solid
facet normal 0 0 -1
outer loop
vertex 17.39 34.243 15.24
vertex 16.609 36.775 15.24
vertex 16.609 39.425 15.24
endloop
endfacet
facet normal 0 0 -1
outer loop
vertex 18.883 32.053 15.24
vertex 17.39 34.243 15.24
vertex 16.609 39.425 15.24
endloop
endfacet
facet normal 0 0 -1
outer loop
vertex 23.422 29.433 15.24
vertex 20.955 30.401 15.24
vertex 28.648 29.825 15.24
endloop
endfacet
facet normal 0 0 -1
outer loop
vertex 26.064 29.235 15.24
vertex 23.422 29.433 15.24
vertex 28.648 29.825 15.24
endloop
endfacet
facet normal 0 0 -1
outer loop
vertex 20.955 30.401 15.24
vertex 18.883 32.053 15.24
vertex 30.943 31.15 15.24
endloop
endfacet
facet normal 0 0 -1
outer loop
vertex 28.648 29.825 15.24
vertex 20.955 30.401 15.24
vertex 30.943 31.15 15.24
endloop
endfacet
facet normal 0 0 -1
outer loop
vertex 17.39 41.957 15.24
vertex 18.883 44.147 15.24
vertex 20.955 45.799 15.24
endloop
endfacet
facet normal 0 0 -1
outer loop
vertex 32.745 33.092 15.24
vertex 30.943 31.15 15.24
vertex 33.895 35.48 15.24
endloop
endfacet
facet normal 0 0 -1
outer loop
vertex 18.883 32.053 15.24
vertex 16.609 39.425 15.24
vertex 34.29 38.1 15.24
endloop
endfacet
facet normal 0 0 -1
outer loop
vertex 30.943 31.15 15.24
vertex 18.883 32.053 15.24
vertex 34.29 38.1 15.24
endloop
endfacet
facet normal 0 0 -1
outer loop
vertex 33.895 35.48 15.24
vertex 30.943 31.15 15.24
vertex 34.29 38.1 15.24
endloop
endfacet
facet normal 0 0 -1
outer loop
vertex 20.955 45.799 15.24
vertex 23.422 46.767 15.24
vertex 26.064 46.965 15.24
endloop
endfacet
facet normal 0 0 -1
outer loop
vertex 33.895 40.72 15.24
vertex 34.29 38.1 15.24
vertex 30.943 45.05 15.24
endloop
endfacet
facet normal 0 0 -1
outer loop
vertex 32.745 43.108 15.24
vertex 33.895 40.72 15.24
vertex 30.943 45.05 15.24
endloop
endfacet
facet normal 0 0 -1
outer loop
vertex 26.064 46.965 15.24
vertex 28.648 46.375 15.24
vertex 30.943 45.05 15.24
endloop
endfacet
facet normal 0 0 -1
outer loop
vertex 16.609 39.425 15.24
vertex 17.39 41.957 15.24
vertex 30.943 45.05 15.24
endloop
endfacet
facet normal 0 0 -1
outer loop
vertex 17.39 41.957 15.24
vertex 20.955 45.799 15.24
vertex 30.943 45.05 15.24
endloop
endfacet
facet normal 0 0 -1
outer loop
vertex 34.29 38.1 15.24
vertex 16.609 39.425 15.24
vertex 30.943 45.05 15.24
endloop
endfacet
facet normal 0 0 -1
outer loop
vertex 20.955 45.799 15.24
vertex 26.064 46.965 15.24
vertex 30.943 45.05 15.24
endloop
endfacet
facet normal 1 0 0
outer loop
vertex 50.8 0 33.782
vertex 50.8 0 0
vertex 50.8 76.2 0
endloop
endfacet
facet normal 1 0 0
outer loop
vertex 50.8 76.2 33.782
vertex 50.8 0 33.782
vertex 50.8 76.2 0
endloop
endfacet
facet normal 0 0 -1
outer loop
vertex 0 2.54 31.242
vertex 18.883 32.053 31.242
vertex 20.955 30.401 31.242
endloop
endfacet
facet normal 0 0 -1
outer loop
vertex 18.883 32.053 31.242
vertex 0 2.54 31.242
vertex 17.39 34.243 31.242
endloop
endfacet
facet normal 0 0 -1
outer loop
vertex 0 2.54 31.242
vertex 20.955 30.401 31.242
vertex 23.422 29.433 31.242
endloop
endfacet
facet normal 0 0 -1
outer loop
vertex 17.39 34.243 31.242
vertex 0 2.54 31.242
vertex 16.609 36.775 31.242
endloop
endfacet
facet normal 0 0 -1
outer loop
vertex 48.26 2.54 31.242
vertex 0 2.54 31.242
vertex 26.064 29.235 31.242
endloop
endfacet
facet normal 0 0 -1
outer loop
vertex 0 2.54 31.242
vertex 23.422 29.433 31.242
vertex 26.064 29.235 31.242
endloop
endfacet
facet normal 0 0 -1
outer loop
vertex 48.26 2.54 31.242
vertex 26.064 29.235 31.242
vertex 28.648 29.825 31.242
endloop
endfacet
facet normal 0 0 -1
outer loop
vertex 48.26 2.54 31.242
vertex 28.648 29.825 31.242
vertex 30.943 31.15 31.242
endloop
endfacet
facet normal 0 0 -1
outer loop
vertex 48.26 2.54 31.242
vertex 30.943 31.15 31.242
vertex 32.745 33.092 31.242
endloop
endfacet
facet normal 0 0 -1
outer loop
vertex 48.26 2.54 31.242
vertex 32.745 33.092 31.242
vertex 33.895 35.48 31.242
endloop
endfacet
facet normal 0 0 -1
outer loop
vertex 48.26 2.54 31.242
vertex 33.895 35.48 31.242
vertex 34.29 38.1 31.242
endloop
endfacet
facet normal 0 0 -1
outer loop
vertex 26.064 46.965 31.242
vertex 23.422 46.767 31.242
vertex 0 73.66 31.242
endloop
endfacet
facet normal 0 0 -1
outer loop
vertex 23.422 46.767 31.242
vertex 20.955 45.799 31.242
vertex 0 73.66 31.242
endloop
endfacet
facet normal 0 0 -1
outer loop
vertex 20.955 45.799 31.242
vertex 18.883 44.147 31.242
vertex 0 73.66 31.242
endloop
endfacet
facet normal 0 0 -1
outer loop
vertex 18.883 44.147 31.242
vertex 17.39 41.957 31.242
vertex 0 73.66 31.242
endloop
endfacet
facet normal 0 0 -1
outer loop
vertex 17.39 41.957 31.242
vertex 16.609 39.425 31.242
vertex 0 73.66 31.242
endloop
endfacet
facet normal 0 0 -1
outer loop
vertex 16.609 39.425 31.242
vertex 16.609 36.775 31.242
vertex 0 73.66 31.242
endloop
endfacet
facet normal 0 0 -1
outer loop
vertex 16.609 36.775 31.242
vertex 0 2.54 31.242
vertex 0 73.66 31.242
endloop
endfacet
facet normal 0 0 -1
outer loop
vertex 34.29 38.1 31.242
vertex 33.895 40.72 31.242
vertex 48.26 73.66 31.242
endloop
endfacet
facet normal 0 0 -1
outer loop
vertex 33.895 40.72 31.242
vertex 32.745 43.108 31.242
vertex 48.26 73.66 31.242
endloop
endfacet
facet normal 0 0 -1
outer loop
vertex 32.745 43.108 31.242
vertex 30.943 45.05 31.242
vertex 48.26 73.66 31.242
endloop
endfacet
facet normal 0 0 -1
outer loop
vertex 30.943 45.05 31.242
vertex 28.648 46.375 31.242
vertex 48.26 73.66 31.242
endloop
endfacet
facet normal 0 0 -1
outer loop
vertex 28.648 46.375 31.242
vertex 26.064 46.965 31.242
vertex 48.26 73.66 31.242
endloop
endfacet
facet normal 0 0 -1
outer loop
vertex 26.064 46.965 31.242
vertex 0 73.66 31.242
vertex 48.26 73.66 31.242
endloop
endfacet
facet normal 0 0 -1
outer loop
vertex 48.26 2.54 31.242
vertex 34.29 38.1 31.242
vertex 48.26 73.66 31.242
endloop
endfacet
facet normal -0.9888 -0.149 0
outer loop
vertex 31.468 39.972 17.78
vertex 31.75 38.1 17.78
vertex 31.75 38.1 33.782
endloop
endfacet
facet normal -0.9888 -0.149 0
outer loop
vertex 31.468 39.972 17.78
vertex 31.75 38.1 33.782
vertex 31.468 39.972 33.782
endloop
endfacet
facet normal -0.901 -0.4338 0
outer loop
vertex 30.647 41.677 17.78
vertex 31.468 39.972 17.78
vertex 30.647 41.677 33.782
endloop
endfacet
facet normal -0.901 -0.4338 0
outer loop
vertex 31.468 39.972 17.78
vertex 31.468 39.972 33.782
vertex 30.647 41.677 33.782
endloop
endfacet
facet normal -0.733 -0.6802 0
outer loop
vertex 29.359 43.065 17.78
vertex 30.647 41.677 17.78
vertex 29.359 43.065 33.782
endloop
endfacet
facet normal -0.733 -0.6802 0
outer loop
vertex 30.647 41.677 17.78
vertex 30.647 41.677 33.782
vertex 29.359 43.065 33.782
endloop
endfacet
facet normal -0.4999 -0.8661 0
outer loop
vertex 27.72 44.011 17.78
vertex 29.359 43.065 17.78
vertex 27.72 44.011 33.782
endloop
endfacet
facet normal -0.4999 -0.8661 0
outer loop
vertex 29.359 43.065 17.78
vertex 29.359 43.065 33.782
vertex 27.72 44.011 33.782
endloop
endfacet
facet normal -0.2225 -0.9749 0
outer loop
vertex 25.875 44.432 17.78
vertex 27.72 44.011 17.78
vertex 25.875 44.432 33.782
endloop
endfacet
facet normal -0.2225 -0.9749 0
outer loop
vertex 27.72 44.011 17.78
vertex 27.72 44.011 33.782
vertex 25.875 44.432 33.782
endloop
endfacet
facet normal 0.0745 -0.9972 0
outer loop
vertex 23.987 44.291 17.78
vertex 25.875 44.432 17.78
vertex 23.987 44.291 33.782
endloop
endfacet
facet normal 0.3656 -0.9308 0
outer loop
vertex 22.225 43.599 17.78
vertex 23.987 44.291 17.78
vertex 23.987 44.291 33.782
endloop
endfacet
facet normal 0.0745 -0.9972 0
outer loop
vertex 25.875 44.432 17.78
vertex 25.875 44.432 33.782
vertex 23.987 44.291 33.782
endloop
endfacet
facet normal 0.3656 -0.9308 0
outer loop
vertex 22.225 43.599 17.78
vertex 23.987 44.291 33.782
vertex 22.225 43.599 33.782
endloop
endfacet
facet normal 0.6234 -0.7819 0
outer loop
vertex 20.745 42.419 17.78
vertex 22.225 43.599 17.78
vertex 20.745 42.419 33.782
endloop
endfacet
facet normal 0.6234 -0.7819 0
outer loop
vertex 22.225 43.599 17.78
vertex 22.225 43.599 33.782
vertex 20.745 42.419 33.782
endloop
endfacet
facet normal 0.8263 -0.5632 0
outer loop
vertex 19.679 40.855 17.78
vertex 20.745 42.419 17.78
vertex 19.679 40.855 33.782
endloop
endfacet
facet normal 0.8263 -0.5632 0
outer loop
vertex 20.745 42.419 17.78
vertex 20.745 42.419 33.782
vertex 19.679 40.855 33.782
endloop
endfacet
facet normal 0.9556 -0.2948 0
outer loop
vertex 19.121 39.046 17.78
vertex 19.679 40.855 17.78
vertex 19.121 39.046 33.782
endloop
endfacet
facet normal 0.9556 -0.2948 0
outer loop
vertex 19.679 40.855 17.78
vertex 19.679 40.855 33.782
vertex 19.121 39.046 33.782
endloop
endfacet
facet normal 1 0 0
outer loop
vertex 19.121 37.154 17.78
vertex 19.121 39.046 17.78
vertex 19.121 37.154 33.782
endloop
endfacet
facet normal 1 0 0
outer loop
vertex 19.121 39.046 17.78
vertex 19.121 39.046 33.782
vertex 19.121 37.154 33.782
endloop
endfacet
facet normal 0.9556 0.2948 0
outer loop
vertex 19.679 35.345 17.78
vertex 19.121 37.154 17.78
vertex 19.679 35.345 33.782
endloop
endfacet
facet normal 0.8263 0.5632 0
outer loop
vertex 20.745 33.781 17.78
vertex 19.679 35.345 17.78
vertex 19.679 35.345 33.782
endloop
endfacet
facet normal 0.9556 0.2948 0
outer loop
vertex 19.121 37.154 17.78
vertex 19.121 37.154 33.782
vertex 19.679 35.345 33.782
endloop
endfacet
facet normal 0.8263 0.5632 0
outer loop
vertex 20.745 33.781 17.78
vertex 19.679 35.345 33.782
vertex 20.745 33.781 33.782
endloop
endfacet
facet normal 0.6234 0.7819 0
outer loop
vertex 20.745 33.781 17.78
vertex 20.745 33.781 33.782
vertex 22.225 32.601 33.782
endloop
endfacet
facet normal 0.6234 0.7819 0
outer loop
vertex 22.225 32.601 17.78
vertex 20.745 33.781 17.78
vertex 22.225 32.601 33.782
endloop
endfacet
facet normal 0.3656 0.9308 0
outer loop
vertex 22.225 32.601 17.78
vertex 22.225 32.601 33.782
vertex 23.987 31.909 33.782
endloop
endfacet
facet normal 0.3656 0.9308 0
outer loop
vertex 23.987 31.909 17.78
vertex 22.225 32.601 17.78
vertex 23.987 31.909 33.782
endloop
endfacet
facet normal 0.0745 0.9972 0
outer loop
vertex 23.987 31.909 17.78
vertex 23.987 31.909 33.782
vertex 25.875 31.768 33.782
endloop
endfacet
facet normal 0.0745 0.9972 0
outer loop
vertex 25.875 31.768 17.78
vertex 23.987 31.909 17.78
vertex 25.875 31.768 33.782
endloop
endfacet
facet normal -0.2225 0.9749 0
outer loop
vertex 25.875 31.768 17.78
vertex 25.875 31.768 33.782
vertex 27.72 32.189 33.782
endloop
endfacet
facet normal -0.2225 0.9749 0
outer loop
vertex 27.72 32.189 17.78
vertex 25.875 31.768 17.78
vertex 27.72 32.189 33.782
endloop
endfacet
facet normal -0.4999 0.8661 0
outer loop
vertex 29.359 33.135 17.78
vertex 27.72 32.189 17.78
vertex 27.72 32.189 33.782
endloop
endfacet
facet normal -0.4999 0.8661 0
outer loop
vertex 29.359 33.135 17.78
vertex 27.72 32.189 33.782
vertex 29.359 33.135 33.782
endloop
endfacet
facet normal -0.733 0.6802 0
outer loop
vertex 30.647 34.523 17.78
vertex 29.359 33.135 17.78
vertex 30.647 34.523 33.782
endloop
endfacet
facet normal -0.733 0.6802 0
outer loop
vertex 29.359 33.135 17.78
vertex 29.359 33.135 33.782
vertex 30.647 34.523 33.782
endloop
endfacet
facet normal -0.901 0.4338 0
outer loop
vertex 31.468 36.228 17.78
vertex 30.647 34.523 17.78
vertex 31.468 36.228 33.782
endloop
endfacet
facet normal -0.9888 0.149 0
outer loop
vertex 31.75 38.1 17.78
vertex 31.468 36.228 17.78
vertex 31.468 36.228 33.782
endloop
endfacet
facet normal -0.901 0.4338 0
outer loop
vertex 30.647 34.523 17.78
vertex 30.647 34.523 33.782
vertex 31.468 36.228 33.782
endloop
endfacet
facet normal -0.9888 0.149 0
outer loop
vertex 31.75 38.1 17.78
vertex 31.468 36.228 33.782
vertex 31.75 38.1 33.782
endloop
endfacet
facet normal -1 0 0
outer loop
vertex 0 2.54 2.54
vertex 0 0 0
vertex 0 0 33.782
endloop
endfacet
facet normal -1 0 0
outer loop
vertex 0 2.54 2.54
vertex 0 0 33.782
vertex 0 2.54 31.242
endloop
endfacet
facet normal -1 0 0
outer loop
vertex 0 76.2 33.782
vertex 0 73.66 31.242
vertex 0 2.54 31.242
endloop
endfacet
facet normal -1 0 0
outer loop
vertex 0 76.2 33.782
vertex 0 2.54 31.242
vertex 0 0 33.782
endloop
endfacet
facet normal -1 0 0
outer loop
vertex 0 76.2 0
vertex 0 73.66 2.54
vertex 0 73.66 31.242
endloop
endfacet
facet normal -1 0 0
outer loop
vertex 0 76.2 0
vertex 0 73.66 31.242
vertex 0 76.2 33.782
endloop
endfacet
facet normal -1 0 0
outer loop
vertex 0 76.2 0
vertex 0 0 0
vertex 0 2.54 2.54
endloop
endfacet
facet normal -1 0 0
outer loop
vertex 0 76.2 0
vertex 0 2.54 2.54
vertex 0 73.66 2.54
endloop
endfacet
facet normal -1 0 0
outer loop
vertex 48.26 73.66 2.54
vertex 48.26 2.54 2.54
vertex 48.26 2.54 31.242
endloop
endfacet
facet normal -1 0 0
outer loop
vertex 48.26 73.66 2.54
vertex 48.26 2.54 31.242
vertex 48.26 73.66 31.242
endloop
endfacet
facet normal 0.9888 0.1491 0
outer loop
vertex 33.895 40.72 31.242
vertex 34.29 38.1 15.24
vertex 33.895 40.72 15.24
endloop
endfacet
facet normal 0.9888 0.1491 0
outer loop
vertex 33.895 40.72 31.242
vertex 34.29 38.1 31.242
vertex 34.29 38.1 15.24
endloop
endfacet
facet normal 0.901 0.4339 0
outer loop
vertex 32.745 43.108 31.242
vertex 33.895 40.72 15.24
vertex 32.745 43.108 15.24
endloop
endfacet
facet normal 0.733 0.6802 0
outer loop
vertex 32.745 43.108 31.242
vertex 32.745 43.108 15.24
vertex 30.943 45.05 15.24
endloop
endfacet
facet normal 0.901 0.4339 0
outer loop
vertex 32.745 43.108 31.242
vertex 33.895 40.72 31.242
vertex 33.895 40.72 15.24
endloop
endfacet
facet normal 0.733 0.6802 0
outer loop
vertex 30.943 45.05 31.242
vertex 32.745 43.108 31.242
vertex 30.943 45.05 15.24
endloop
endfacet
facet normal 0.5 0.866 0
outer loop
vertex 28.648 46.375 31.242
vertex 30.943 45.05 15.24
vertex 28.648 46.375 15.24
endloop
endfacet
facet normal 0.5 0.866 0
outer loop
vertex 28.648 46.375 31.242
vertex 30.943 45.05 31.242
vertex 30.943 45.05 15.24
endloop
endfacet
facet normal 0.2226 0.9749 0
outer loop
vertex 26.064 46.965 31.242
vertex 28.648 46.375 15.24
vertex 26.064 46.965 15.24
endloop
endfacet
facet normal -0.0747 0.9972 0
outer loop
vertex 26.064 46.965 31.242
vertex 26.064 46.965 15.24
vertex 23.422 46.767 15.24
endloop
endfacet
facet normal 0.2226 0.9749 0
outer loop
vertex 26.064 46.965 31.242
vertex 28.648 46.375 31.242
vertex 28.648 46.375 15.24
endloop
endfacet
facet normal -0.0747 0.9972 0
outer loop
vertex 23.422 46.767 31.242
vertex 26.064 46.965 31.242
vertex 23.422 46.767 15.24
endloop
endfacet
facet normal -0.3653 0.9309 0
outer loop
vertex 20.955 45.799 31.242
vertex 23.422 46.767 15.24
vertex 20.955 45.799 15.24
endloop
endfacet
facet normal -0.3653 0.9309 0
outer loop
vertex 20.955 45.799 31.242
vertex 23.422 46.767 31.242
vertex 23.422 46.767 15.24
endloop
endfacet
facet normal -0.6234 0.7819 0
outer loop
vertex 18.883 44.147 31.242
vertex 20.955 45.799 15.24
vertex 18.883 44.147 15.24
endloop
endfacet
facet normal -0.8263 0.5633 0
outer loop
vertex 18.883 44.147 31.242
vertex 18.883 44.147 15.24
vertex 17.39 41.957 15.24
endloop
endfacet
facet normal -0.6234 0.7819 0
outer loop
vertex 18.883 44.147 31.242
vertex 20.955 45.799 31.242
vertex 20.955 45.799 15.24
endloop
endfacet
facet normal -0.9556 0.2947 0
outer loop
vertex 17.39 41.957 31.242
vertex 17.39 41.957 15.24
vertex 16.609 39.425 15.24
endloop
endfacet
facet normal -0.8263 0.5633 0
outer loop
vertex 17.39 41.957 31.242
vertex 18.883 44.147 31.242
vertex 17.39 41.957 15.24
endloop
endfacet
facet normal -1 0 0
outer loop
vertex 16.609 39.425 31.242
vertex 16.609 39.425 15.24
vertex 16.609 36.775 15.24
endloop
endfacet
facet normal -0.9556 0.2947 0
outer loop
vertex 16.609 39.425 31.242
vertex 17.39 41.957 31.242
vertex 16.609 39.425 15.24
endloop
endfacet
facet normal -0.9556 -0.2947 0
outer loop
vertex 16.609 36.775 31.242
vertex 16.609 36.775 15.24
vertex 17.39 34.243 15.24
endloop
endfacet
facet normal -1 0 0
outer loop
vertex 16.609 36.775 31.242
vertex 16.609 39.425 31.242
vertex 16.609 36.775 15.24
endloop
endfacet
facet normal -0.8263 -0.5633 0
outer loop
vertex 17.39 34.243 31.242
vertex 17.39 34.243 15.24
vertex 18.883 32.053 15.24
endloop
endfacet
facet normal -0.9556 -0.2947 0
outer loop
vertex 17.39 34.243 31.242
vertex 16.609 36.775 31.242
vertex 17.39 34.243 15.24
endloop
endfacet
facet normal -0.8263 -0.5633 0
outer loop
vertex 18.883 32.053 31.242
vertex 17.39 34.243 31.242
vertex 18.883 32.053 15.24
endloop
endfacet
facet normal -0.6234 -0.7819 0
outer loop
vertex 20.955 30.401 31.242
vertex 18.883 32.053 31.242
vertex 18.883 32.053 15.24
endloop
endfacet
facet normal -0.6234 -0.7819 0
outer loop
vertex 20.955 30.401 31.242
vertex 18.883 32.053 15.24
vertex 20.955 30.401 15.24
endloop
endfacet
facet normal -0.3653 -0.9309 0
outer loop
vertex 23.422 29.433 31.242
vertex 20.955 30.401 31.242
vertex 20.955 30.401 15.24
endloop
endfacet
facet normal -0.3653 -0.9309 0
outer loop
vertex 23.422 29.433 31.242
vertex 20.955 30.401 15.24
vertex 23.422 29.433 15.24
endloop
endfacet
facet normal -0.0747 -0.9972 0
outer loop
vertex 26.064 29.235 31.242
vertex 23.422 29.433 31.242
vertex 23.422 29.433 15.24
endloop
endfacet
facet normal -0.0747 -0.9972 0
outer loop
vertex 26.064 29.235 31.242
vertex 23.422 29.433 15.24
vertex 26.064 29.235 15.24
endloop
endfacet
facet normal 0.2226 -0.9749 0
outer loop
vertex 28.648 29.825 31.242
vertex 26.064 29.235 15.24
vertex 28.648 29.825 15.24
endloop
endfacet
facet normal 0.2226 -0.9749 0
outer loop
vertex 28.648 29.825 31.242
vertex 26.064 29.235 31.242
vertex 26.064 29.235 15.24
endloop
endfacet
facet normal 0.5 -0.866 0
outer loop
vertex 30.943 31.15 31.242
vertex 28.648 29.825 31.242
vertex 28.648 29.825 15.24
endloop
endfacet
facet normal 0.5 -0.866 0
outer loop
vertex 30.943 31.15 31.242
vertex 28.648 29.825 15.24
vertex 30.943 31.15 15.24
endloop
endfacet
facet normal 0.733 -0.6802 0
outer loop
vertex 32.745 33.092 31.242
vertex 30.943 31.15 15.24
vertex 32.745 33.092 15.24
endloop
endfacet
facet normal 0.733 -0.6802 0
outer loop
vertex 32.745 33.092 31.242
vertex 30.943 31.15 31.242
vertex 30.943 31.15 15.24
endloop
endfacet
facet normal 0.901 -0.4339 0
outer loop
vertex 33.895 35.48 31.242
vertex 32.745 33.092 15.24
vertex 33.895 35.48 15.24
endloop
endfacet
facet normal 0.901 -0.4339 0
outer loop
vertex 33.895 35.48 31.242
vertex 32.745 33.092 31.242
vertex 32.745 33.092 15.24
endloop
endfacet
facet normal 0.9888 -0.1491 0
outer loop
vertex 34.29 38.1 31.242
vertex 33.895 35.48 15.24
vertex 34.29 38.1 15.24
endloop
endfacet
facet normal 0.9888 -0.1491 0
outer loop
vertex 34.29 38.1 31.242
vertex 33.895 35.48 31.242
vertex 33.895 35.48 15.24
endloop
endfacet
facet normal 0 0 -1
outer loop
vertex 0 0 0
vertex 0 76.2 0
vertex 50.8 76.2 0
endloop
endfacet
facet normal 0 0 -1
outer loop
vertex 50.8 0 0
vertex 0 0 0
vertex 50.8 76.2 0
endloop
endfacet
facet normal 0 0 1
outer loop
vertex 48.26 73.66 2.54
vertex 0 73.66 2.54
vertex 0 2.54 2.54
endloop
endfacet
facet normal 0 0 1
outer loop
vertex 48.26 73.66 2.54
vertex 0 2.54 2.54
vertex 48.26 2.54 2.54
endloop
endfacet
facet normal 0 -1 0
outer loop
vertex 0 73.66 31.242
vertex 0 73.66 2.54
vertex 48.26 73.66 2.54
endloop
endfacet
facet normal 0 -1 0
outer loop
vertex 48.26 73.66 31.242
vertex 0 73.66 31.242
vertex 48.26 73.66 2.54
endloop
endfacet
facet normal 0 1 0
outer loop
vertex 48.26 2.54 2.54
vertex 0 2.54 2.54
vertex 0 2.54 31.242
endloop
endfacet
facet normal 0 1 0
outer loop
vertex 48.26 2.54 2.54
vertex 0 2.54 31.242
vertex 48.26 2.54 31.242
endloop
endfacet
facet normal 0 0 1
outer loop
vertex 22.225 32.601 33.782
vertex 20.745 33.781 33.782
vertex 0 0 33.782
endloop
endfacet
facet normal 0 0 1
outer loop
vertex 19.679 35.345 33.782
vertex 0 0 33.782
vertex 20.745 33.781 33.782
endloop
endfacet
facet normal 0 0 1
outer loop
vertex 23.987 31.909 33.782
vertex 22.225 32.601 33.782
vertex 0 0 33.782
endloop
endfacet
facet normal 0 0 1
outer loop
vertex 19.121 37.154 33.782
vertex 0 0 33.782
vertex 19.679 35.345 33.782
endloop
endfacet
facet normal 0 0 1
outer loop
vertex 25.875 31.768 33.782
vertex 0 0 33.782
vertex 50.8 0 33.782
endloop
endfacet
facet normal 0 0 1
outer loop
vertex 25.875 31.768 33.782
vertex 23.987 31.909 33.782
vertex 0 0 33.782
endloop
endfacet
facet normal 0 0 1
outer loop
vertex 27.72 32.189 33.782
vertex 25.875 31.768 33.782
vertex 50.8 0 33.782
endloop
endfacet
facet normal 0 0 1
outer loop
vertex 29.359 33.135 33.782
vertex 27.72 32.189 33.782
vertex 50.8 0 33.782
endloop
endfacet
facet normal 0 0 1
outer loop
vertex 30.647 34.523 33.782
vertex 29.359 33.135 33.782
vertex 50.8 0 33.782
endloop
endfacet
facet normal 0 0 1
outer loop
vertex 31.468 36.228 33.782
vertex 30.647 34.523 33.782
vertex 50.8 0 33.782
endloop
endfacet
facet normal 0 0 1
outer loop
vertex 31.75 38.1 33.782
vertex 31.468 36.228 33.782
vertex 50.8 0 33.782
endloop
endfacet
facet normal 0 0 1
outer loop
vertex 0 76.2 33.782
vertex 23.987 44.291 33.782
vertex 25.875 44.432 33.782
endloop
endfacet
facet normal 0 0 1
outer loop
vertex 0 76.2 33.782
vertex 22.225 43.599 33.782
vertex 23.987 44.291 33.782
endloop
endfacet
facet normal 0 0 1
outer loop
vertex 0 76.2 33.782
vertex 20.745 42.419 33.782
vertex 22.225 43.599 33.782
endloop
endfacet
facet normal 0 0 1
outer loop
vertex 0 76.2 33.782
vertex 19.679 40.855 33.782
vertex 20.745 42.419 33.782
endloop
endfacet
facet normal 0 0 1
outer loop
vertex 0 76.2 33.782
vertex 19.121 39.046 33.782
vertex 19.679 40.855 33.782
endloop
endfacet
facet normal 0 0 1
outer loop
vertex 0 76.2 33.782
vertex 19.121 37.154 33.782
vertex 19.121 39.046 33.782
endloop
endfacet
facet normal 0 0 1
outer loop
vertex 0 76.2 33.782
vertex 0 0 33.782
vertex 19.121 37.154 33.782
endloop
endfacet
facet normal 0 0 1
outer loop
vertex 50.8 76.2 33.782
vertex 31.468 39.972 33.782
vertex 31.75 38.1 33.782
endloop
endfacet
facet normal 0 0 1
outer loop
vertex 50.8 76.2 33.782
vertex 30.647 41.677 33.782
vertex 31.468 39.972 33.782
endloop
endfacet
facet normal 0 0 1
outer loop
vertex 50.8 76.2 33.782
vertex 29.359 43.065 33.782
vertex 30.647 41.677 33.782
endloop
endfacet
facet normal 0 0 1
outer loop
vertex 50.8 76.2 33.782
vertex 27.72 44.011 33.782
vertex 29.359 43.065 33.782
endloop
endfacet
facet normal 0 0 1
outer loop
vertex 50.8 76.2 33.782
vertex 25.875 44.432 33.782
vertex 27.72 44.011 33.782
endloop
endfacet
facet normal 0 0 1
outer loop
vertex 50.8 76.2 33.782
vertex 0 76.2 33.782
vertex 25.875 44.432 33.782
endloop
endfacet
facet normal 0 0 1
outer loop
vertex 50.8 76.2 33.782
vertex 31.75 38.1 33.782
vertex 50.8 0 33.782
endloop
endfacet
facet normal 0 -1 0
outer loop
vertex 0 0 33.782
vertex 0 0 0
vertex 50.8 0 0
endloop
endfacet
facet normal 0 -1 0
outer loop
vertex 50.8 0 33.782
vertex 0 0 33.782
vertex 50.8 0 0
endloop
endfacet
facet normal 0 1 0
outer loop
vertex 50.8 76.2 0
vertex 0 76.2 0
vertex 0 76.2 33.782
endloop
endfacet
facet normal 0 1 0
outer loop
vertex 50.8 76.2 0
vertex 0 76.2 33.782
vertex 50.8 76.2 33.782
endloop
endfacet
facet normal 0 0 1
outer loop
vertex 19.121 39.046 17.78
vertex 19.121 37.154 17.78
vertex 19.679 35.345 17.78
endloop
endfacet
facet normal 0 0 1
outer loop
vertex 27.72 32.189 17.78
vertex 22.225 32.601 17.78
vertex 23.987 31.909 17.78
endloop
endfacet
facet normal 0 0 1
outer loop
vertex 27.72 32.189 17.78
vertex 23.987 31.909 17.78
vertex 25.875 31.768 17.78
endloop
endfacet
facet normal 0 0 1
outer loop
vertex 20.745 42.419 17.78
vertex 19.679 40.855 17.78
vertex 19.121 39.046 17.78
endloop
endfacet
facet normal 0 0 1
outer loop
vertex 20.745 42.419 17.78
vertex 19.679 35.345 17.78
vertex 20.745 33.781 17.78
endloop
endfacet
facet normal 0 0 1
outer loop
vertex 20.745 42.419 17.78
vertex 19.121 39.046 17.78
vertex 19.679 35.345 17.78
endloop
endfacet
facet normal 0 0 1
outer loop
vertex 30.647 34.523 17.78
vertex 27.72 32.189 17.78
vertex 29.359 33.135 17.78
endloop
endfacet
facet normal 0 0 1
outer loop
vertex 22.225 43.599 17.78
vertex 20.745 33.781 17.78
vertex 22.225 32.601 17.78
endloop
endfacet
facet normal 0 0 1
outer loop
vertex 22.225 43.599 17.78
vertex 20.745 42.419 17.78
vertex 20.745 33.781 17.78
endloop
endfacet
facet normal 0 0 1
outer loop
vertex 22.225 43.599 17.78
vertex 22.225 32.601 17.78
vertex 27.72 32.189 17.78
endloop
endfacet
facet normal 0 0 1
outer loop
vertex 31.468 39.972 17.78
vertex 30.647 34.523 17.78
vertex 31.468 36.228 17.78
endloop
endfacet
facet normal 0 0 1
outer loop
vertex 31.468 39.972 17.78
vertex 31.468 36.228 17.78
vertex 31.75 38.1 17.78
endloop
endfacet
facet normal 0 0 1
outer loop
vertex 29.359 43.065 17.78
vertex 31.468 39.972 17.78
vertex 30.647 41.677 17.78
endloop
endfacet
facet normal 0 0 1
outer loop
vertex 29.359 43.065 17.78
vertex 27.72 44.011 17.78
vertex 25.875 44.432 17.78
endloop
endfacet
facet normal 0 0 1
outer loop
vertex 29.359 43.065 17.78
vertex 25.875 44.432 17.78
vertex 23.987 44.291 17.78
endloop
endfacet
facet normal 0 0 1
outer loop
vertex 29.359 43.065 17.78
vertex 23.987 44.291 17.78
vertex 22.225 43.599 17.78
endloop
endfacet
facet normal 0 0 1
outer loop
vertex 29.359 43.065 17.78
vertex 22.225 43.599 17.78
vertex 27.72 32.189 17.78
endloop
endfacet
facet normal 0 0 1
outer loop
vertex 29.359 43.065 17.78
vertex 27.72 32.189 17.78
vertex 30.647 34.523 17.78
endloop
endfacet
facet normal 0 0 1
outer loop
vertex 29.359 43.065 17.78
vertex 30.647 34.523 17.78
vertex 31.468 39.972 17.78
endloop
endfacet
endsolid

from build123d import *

# Parameters (mm, degrees)
F0_W     = 50.8
F0_H     = 76.2
F1_DEPTH = 33.782
F2_R     = 6.35
F3_DEPTH = 16.002
F4_T     = -2.54


with BuildPart() as f1:
    # F0 (on Top) → F1 (new body)
    with BuildSketch(Plane.XY):
        with Locations((25.4, 38.1)):
            Rectangle(F0_W, F0_H)
    extrude(amount=F1_DEPTH)

    # F2 (on face) → F3 (cut)
    with BuildSketch(Plane.XY.offset(33.782)):
        with Locations((25.4, 38.1)):
            Circle(F2_R)
    extrude(amount=-F3_DEPTH, mode=Mode.SUBTRACT)

    # F4
    f4_openings = [f1.faces().sort_by_distance(p)[0] for p in [
        (0, 38.1, 16.891),
    ]]
    offset(amount=F4_T, openings=f4_openings, kind=Kind.INTERSECTION)


solid = f1.part
